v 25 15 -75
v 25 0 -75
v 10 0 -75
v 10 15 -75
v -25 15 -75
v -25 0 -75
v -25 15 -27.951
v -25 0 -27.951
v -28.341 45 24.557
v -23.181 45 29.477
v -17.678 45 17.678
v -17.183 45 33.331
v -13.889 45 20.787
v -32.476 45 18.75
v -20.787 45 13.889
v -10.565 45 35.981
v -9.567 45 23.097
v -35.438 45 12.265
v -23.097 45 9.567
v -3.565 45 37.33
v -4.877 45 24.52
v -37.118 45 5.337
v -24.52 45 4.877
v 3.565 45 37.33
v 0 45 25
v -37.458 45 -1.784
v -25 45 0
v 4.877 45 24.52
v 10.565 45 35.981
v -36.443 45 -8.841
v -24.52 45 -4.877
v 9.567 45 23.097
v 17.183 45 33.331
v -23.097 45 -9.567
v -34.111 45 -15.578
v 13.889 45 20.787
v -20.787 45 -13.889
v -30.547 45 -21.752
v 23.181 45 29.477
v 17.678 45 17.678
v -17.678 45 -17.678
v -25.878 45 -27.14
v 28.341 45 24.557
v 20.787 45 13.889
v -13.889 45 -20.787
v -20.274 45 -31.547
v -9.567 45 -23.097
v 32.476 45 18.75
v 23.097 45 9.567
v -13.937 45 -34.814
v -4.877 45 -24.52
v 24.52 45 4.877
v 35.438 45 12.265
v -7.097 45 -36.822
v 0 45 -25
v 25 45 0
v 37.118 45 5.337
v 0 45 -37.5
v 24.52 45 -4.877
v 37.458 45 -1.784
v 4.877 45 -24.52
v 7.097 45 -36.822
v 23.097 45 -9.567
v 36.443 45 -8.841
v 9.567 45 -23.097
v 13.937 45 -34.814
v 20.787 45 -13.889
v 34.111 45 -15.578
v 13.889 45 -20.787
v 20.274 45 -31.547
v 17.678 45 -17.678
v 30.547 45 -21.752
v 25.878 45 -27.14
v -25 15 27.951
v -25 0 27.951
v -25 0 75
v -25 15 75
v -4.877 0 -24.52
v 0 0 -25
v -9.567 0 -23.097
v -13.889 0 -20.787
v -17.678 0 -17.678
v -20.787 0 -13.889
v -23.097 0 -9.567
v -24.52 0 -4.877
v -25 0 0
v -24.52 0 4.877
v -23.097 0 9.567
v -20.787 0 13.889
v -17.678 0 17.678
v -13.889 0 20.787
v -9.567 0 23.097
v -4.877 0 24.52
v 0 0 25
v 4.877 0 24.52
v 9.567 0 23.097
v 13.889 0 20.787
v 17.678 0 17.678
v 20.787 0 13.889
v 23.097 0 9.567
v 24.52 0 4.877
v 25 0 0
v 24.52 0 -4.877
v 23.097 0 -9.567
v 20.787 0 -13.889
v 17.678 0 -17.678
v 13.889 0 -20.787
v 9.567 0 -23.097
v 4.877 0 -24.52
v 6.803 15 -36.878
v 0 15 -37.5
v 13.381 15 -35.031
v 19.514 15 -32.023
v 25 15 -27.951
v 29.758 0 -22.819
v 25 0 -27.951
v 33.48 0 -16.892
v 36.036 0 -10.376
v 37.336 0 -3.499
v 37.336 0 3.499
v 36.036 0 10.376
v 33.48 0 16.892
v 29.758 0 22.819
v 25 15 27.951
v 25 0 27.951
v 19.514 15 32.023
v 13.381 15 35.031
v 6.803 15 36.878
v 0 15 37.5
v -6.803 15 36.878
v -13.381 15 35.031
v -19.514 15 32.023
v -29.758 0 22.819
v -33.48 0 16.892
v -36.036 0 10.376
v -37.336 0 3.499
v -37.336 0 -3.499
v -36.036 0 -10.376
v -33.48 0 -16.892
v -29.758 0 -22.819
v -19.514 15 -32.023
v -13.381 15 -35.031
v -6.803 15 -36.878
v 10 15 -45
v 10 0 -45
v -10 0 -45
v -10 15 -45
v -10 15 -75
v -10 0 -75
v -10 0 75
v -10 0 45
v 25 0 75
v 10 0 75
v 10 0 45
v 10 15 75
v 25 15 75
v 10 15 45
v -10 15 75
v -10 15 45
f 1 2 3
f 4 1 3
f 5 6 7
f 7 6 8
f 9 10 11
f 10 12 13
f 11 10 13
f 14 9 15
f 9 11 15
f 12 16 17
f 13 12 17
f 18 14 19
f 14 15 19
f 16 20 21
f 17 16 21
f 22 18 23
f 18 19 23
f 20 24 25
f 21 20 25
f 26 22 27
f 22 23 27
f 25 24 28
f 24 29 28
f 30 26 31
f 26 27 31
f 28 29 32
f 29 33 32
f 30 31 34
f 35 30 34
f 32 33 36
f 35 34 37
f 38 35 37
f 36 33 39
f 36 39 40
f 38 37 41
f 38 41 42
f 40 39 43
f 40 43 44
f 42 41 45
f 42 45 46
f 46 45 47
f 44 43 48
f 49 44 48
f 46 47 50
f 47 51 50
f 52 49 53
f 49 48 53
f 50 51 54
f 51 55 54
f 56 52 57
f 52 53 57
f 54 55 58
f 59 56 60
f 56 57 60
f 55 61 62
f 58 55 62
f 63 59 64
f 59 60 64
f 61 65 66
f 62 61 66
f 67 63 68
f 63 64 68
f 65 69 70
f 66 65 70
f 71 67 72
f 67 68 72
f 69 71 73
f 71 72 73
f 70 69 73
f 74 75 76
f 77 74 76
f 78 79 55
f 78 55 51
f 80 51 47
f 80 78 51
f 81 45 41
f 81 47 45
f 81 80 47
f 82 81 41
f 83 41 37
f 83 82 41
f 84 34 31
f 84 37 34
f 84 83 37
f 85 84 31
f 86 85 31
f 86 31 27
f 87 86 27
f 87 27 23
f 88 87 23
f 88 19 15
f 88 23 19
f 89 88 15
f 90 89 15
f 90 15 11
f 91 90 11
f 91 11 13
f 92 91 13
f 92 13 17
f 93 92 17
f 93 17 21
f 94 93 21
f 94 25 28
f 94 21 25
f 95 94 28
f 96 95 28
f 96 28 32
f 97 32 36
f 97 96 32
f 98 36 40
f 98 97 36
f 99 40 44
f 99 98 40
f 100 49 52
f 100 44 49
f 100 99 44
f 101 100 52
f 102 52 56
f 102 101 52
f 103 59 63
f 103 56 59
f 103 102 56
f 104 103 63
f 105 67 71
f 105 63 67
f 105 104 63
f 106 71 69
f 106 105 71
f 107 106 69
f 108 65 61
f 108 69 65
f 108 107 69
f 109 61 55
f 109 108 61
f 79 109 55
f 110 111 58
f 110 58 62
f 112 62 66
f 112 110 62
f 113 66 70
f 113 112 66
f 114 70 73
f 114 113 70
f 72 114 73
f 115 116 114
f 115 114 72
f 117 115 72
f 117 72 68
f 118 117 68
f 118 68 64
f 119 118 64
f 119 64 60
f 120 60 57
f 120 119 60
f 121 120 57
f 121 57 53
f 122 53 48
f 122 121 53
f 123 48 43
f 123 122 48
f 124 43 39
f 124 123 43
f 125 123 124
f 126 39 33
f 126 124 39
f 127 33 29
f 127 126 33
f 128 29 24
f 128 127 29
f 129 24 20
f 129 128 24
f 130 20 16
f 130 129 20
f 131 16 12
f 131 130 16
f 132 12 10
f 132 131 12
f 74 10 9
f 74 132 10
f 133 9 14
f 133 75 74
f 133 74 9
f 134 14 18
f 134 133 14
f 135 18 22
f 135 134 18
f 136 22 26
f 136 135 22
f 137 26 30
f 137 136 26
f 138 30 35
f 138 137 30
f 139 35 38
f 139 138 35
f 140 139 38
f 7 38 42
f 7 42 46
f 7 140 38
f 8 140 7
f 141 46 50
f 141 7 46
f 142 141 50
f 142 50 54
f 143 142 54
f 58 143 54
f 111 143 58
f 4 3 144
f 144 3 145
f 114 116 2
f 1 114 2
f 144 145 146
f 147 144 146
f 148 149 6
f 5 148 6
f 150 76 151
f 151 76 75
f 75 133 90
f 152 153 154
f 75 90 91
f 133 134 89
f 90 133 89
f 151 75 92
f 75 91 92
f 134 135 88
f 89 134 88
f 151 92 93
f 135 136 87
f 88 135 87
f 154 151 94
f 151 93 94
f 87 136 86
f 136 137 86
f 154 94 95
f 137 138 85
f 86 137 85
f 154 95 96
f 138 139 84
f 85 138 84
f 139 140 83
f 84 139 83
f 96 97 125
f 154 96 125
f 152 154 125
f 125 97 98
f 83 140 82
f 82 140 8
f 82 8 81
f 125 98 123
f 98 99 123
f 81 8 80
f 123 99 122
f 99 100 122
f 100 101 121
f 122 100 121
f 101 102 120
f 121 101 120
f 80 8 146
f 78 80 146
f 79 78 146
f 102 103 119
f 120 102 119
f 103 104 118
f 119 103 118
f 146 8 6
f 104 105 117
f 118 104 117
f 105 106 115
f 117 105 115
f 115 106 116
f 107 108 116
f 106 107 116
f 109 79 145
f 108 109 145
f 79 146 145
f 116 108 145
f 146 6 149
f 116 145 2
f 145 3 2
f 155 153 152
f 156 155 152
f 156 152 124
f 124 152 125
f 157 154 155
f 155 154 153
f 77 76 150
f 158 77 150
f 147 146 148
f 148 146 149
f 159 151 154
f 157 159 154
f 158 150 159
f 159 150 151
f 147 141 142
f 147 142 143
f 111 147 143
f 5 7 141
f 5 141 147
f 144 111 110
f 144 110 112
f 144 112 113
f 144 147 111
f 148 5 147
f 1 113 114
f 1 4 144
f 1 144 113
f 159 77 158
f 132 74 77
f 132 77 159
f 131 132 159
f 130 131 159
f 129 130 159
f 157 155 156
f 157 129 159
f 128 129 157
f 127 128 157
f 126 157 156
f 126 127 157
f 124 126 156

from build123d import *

# Parameters (mm, degrees)
BOSS_EXTRUDE1_DEPTH = 15
SKETCH3_R           = 37.5
SKETCH3_R_2         = 25
BOSS_EXTRUDE2_DEPTH = 45
CUT_EXTRUDE1_START  = -45
SKETCH4_R           = 25
CUT_EXTRUDE1_DEPTH  = 45


with BuildPart() as part:
    # Sketch1 → Boss-Extrude1 (new body)
    with BuildSketch(Plane(origin=(0, 0, 0), x_dir=(1, 0, 0), z_dir=(0, 1, 0))):
        Polygon((-25, 75), (-25, -75), (-10, -75), (-10, -45), (10, -45), (10, -75), (25, -75), (25, 75), (10, 75), (10, 45), (-10, 45), (-10, 75), align=None)
    extrude(amount=BOSS_EXTRUDE1_DEPTH)

    # Sketch3 → Boss-Extrude2 (add)
    with BuildSketch(Plane.XZ):
        with Locations(Location((0, 0, 0), (0, 0, 270))):
            Circle(SKETCH3_R)
        with Locations(Location((0, 0, 0), (0, 0, 270))):
            Circle(SKETCH3_R_2, mode=Mode.SUBTRACT)
    extrude(amount=-BOSS_EXTRUDE2_DEPTH)

    # Sketch4 → Cut-Extrude1 (cut)
    with BuildSketch(Plane(origin=(0, 15, 0), x_dir=(1, 0, 0), z_dir=(0, 1, 0)).offset(CUT_EXTRUDE1_START)):
        with Locations(Location((0, 0, 0), (0, 0, 90))):
            Circle(SKETCH4_R)
    extrude(amount=CUT_EXTRUDE1_DEPTH, mode=Mode.SUBTRACT)


solid = part.part
